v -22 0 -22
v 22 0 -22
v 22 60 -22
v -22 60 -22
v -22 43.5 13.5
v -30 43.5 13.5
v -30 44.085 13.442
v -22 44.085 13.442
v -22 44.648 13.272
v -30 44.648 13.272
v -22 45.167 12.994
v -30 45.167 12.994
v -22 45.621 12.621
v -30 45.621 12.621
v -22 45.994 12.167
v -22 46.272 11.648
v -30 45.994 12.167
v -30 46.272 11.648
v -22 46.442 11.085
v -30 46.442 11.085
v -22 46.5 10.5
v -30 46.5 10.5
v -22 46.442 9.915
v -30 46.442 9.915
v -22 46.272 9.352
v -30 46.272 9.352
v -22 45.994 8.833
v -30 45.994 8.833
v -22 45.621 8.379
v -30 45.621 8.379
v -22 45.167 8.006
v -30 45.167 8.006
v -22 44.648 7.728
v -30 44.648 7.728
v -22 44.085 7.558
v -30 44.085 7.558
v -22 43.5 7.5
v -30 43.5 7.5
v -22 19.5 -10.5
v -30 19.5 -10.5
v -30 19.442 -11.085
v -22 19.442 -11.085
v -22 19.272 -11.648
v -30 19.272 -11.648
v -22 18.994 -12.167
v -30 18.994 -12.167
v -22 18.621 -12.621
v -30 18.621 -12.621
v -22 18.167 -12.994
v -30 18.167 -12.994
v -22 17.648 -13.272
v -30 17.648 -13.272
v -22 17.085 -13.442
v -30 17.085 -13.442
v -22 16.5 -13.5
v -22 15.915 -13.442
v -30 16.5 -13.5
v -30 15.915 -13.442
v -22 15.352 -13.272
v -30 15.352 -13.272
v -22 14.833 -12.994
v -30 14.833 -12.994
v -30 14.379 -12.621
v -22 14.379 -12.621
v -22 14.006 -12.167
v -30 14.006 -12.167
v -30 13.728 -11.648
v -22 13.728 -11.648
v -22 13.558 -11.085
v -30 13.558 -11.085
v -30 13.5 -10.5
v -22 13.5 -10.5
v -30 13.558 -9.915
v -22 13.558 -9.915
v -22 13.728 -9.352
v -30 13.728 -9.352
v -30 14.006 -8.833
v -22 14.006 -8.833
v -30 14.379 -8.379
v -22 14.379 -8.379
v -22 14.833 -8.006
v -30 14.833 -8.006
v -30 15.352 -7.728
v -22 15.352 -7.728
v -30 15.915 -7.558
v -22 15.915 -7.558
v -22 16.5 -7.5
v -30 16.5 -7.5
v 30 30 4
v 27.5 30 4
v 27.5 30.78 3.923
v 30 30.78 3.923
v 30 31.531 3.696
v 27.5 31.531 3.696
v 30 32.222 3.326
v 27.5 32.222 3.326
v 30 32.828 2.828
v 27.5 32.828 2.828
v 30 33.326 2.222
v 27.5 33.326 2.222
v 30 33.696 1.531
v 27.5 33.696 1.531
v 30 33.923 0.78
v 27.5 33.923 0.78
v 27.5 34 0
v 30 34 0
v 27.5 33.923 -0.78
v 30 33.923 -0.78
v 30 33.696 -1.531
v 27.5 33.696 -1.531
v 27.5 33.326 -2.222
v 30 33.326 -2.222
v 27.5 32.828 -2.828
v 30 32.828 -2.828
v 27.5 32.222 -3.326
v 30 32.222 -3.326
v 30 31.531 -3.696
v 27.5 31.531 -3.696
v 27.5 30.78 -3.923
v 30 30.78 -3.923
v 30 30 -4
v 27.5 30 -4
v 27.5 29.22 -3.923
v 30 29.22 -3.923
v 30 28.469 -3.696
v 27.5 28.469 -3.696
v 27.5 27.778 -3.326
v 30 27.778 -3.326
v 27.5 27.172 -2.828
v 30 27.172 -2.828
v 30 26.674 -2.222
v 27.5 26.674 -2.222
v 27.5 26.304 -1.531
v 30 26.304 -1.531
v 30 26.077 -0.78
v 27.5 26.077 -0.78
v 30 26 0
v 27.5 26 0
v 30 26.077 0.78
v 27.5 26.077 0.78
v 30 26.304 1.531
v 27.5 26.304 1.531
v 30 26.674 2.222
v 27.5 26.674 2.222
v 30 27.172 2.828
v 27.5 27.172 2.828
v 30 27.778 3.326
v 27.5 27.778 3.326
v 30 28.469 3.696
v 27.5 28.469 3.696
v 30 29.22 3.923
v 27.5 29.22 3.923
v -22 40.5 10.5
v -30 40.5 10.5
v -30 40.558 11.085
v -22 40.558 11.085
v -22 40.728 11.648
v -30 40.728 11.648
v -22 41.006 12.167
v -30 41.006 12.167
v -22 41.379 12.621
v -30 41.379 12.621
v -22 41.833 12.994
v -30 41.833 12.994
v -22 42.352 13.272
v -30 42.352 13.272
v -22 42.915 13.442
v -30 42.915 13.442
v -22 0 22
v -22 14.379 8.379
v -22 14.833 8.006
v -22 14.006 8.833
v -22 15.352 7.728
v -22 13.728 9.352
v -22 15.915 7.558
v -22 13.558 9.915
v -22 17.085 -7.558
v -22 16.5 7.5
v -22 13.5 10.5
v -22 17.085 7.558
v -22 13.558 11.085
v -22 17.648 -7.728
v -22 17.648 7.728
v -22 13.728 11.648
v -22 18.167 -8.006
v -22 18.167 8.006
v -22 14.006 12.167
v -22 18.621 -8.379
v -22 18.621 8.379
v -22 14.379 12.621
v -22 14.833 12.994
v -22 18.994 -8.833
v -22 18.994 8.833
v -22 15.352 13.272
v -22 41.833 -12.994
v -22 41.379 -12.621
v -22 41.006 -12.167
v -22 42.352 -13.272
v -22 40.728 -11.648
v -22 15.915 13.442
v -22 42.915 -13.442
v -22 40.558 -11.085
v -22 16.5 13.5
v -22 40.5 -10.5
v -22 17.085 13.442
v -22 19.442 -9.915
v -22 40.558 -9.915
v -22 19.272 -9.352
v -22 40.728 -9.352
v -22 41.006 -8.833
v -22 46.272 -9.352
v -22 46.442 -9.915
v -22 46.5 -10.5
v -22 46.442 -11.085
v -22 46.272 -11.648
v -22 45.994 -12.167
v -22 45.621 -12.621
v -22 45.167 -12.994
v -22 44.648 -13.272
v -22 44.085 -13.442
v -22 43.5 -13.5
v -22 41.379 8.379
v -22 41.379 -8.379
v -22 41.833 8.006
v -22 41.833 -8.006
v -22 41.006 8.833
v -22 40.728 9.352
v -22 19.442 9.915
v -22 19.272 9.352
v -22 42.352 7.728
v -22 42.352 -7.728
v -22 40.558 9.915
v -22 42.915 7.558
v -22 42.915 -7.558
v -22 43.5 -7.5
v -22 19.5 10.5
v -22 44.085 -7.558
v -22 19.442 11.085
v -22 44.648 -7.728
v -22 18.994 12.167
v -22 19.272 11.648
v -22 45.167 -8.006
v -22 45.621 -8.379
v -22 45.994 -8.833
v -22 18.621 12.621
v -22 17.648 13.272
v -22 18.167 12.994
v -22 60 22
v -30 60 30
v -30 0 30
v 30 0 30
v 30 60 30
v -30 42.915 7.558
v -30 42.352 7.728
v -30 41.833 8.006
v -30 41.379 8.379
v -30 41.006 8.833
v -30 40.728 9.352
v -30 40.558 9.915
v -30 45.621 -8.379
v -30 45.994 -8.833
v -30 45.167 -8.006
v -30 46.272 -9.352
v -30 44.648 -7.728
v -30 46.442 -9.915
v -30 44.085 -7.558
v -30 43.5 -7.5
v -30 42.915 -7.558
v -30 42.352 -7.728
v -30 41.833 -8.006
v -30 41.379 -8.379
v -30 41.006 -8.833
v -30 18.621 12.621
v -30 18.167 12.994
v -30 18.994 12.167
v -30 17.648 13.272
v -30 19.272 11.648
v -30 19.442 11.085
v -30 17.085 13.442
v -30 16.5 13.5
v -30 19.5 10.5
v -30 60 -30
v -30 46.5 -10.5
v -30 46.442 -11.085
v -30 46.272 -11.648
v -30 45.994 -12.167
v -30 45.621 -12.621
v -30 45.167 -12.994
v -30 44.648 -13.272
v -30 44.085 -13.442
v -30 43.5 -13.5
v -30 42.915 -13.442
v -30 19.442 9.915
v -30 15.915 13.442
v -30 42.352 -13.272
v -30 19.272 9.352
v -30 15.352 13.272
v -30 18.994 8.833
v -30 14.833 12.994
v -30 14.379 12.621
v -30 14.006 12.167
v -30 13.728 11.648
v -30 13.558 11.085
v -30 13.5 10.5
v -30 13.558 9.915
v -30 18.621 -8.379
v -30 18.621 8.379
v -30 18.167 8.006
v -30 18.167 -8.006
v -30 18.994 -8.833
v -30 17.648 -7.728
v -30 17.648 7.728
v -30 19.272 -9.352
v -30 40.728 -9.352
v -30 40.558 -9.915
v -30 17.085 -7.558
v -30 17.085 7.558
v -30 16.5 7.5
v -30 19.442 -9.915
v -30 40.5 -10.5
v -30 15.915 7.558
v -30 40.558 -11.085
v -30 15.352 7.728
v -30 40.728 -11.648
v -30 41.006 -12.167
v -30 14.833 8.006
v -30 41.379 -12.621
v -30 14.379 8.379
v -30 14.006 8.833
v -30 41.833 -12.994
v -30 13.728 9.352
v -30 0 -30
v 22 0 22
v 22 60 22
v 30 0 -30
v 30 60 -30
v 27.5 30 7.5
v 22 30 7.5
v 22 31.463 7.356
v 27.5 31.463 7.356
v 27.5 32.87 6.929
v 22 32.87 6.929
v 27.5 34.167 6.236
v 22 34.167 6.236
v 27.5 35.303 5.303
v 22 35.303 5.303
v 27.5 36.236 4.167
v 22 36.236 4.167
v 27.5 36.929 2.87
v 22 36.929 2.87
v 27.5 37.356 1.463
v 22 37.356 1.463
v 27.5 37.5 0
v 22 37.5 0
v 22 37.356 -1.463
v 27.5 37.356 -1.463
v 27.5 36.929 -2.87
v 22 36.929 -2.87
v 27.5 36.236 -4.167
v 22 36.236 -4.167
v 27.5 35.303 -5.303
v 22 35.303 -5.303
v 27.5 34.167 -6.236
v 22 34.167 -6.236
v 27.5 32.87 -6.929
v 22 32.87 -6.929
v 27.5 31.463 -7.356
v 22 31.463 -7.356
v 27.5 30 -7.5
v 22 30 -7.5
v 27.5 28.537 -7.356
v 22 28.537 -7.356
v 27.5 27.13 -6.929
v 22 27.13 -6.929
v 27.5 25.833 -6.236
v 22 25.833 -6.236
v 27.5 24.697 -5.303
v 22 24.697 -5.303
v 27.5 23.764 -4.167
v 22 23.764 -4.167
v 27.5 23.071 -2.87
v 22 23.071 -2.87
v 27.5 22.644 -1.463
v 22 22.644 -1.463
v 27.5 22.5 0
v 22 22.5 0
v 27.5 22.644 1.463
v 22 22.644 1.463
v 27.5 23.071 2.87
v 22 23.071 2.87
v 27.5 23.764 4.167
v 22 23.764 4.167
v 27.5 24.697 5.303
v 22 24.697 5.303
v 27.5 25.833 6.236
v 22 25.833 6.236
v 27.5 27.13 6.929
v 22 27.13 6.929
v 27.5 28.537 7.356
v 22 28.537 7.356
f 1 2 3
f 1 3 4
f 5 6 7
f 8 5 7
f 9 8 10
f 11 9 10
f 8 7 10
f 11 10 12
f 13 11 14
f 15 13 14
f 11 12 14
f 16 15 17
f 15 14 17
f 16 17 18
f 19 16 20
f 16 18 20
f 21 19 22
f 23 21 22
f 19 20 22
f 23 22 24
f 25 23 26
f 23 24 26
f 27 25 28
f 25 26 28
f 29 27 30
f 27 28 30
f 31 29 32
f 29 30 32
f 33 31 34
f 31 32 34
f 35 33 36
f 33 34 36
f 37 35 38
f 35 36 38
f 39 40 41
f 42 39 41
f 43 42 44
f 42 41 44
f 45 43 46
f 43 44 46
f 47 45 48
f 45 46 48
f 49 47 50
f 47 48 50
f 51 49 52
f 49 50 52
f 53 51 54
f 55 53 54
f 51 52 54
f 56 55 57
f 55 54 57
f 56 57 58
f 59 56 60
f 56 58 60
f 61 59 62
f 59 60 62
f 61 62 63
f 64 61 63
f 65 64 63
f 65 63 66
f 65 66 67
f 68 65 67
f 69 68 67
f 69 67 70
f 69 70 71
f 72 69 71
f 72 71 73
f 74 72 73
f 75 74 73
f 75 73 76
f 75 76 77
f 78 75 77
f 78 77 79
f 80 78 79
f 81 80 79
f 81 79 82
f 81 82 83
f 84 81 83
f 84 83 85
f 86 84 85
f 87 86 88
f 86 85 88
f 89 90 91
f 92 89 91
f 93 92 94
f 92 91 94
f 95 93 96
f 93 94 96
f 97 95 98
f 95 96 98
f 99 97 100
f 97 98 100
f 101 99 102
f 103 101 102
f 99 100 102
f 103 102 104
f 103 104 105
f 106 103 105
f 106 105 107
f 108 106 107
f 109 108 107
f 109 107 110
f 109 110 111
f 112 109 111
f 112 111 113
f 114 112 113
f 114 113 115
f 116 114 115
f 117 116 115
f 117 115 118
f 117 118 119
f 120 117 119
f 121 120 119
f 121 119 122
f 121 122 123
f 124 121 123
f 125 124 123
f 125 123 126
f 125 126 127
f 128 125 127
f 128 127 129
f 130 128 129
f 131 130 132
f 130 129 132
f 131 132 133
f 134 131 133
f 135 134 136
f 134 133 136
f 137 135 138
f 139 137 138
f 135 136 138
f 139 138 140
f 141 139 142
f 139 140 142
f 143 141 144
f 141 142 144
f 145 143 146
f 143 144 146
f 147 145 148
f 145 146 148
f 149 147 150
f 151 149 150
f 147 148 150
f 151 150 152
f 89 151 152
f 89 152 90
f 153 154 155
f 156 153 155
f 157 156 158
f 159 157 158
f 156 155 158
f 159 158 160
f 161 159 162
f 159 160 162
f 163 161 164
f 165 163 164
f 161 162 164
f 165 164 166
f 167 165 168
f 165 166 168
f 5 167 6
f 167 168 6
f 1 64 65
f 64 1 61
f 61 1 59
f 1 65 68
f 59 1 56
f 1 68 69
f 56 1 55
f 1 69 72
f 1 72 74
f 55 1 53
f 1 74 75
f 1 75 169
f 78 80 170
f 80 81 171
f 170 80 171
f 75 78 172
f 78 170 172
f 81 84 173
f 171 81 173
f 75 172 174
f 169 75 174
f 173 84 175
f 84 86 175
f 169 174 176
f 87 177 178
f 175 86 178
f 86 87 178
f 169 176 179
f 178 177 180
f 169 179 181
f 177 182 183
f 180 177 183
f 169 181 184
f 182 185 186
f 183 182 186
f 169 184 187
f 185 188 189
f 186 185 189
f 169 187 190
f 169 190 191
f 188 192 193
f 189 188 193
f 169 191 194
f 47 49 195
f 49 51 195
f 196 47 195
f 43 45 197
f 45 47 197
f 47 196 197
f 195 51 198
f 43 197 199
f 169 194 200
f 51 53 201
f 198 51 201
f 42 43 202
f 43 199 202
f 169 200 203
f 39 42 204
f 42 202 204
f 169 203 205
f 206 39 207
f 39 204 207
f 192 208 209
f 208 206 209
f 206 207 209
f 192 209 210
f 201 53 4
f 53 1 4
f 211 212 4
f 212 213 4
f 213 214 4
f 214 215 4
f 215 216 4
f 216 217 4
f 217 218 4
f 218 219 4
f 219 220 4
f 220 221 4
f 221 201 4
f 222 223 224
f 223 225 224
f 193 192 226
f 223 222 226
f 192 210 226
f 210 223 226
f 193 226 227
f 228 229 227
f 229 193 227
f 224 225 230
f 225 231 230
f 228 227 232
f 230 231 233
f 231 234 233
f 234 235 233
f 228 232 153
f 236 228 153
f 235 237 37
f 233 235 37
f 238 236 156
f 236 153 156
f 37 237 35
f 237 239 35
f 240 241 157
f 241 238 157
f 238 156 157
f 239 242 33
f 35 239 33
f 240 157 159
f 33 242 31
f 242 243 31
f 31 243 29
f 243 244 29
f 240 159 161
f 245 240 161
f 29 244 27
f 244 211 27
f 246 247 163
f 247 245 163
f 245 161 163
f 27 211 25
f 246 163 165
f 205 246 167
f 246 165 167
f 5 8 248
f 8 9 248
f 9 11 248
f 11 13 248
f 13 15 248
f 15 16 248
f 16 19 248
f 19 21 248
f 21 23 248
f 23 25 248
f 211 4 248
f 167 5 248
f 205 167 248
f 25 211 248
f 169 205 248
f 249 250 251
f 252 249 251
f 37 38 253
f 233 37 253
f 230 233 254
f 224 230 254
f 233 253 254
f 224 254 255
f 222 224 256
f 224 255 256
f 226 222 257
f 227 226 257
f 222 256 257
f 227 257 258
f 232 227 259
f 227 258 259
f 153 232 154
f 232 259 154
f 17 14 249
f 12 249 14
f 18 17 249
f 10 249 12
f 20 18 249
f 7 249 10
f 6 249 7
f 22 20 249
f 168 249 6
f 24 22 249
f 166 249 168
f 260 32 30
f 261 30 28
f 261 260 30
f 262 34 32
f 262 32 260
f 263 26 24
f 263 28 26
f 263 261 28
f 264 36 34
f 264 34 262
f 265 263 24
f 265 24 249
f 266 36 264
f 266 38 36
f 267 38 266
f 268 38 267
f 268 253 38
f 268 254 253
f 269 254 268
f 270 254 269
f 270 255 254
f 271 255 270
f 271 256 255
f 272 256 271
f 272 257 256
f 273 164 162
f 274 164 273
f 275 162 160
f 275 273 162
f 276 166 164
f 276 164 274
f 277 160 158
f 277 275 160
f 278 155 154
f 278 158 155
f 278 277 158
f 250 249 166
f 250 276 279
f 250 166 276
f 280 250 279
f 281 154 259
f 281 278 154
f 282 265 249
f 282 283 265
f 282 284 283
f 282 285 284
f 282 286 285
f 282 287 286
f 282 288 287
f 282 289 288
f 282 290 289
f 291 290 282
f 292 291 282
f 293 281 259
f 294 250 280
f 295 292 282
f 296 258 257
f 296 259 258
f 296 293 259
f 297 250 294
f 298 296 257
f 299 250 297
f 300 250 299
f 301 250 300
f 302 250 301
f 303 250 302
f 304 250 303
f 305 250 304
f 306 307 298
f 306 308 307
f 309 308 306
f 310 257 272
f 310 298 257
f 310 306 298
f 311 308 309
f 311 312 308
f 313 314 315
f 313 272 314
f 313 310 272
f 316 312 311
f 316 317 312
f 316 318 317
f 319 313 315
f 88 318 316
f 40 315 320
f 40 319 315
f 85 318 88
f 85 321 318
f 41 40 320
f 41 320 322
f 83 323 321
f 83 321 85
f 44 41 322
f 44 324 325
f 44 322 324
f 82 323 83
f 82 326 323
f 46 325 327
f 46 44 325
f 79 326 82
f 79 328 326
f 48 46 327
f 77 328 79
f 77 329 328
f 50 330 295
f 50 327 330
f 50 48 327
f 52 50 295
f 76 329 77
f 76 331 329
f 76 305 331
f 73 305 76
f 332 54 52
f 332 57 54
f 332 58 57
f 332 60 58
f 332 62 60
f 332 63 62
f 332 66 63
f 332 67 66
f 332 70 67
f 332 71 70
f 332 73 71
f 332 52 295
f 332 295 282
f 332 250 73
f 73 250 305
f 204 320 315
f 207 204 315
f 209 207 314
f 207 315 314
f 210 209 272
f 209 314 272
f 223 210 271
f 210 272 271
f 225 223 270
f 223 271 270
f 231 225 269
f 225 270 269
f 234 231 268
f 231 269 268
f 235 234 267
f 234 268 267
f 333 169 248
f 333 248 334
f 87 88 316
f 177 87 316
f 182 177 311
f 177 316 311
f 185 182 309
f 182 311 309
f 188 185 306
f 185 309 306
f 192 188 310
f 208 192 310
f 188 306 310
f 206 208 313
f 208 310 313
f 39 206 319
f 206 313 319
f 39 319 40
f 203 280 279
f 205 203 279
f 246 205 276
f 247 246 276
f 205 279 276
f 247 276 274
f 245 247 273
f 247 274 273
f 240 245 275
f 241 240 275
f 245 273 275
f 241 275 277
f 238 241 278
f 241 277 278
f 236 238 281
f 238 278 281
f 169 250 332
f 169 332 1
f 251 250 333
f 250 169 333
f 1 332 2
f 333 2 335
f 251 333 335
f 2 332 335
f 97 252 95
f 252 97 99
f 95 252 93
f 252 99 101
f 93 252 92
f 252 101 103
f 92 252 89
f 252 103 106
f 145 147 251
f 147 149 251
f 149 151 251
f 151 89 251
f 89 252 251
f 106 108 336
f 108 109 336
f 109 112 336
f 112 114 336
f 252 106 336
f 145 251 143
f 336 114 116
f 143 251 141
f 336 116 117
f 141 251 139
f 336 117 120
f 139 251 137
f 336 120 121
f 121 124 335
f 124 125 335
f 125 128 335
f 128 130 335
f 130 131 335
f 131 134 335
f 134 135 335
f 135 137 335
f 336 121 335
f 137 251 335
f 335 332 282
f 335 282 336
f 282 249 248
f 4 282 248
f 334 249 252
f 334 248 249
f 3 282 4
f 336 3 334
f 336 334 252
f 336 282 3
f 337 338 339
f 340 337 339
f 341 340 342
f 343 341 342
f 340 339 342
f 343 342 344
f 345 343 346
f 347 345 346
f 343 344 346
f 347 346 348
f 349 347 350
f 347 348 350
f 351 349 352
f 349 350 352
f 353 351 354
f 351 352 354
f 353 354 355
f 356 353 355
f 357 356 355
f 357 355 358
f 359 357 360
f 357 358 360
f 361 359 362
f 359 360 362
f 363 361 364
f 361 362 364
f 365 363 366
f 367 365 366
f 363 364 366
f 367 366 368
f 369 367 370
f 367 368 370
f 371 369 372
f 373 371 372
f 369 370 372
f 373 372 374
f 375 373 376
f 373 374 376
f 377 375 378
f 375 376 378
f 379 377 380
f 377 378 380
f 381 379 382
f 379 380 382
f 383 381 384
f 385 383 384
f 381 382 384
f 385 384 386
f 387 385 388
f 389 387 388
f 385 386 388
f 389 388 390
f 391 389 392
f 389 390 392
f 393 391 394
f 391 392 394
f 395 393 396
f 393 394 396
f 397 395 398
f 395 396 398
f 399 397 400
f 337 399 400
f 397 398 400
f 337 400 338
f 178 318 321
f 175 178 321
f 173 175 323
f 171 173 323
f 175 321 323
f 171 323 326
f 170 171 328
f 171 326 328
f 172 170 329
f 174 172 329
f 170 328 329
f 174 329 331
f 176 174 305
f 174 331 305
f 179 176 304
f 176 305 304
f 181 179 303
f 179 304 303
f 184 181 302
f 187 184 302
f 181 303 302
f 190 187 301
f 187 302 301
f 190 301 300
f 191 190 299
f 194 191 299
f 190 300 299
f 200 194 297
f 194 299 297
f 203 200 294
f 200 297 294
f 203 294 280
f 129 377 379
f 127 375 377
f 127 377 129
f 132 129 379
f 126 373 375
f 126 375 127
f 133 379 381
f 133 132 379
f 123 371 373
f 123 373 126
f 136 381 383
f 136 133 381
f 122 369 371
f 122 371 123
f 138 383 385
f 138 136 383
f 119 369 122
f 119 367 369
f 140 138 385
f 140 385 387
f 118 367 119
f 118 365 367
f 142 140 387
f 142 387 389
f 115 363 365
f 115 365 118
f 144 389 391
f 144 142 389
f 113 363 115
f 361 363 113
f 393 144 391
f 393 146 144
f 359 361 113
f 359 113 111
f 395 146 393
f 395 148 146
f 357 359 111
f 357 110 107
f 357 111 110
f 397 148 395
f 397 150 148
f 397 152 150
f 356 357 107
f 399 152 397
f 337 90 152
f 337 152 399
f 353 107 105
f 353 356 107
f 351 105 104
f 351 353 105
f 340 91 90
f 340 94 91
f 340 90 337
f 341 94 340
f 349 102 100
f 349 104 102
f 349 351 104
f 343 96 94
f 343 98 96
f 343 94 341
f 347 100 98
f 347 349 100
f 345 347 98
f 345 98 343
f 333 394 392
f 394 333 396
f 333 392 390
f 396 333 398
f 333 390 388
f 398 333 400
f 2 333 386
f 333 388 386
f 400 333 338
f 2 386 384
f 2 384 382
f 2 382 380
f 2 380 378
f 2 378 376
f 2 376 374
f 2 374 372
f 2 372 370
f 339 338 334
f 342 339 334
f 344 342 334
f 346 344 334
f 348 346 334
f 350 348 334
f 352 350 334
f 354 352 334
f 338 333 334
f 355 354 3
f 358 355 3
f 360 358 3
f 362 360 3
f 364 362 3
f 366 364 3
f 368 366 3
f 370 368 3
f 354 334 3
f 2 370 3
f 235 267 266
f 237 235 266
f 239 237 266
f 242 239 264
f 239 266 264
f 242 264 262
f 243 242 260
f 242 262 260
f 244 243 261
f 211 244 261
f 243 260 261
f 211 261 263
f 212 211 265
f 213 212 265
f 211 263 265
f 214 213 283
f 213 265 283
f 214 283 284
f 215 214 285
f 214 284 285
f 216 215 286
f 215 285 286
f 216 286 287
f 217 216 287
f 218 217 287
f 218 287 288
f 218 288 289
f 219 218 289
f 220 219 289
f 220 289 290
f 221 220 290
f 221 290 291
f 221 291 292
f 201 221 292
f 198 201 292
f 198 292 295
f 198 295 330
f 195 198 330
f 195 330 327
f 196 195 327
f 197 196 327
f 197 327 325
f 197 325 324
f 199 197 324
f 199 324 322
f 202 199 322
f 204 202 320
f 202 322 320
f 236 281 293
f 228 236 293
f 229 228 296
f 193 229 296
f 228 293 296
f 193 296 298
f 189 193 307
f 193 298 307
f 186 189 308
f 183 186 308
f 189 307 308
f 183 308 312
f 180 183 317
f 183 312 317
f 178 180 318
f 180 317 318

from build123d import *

# Parameters (mm, degrees)
SKETCH1_W           = 60
SKETCH1_H           = 60
BOSS_EXTRUDE1_DEPTH = 60
CUT_EXTRUDE1_DEPTH  = 108
SKETCH2_R           = 4
CUT_EXTRUDE2_DEPTH  = 108
CUT_EXTRUDE3_DEPTH  = 30
SKETCH4_R           = 7.5
CUT_EXTRUDE4_DEPTH  = 5.5


with BuildPart() as part:
    # Sketch1 → Boss-Extrude1 (new body)
    with BuildSketch(Plane(origin=(0, 0, 0), x_dir=(1, 0, 0), z_dir=(0, 1, 0))):
        Rectangle(SKETCH1_W, SKETCH1_H)
    extrude(amount=BOSS_EXTRUDE1_DEPTH)

    # 3DSketch1 → Cut-Extrude1 (cut)
    with BuildSketch(Plane(origin=(-22, 60, -22), x_dir=(0.7071067811865481, 0, 0.707106781186547), z_dir=(0, 1, 0))):
        Polygon((0, 0), (31.112698372, -31.112698372), (62.225396744, 0), (31.112698372, 31.112698372), align=None)
    extrude(amount=-CUT_EXTRUDE1_DEPTH, mode=Mode.SUBTRACT)

    # Sketch2 → Cut-Extrude2 (cut)
    with BuildSketch(Plane.ZY.offset(-22)):
        with Locations((0, 30)):
            Circle(SKETCH2_R)
    extrude(amount=-CUT_EXTRUDE2_DEPTH, mode=Mode.SUBTRACT)

    # Sketch3 → Cut-Extrude3 (cut)
    with BuildSketch(Plane.ZY.offset(30)):
        with BuildLine():
            Line((-10.5, 40.5), (-10.5, 43.5))
            Line((-10.5, 43.5), (-7.5, 43.5))
            ThreePointArc((-7.5, 43.5), (-12.621320344, 45.621320344), (-10.5, 40.5))
        make_face()
        with BuildLine():
            Line((-7.5, 43.5), (-10.5, 43.5))
            Line((-10.5, 43.5), (-10.5, 40.5))
            ThreePointArc((-10.5, 40.5), (-8.378679656, 41.378679656), (-7.5, 43.5))
        make_face()
        with BuildLine():
            ThreePointArc((13.5, 43.5), (10.5, 46.5), (7.5, 43.5))
            Line((7.5, 43.5), (10.5, 43.5))
            Line((10.5, 43.5), (10.5, 40.5))
            ThreePointArc((10.5, 40.5), (12.621320344, 41.378679656), (13.5, 43.5))
        make_face()
        with BuildLine():
            Line((10.5, 43.5), (7.5, 43.5))
            ThreePointArc((7.5, 43.5), (8.378679656, 41.378679656), (10.5, 40.5))
            Line((10.5, 40.5), (10.5, 43.5))
        make_face()
        with BuildLine():
            ThreePointArc((13.5, 16.5), (12.621320344, 18.621320344), (10.5, 19.5))
            Line((10.5, 19.5), (10.5, 16.5))
            Line((10.5, 16.5), (7.5, 16.5))
            ThreePointArc((7.5, 16.5), (10.5, 13.5), (13.5, 16.5))
        make_face()
        with BuildLine():
            Line((10.5, 16.5), (10.5, 19.5))
            ThreePointArc((10.5, 19.5), (8.378679656, 18.621320344), (7.5, 16.5))
            Line((7.5, 16.5), (10.5, 16.5))
        make_face()
        with BuildLine():
            ThreePointArc((-7.5, 16.5), (-8.378679656, 18.621320344), (-10.5, 19.5))
            Line((-10.5, 19.5), (-10.5, 16.5))
            Line((-10.5, 16.5), (-7.5, 16.5))
        make_face()
        with BuildLine():
            Line((-10.5, 16.5), (-10.5, 19.5))
            ThreePointArc((-10.5, 19.5), (-12.621320344, 14.378679656), (-7.5, 16.5))
            Line((-7.5, 16.5), (-10.5, 16.5))
        make_face()
    extrude(amount=-CUT_EXTRUDE3_DEPTH, mode=Mode.SUBTRACT)

    # Sketch4 → Cut-Extrude4 (cut)
    with BuildSketch(Plane.ZY.offset(-22)):
        with Locations((0, 30)):
            Circle(SKETCH4_R)
    extrude(amount=-CUT_EXTRUDE4_DEPTH, mode=Mode.SUBTRACT)


solid = part.part
